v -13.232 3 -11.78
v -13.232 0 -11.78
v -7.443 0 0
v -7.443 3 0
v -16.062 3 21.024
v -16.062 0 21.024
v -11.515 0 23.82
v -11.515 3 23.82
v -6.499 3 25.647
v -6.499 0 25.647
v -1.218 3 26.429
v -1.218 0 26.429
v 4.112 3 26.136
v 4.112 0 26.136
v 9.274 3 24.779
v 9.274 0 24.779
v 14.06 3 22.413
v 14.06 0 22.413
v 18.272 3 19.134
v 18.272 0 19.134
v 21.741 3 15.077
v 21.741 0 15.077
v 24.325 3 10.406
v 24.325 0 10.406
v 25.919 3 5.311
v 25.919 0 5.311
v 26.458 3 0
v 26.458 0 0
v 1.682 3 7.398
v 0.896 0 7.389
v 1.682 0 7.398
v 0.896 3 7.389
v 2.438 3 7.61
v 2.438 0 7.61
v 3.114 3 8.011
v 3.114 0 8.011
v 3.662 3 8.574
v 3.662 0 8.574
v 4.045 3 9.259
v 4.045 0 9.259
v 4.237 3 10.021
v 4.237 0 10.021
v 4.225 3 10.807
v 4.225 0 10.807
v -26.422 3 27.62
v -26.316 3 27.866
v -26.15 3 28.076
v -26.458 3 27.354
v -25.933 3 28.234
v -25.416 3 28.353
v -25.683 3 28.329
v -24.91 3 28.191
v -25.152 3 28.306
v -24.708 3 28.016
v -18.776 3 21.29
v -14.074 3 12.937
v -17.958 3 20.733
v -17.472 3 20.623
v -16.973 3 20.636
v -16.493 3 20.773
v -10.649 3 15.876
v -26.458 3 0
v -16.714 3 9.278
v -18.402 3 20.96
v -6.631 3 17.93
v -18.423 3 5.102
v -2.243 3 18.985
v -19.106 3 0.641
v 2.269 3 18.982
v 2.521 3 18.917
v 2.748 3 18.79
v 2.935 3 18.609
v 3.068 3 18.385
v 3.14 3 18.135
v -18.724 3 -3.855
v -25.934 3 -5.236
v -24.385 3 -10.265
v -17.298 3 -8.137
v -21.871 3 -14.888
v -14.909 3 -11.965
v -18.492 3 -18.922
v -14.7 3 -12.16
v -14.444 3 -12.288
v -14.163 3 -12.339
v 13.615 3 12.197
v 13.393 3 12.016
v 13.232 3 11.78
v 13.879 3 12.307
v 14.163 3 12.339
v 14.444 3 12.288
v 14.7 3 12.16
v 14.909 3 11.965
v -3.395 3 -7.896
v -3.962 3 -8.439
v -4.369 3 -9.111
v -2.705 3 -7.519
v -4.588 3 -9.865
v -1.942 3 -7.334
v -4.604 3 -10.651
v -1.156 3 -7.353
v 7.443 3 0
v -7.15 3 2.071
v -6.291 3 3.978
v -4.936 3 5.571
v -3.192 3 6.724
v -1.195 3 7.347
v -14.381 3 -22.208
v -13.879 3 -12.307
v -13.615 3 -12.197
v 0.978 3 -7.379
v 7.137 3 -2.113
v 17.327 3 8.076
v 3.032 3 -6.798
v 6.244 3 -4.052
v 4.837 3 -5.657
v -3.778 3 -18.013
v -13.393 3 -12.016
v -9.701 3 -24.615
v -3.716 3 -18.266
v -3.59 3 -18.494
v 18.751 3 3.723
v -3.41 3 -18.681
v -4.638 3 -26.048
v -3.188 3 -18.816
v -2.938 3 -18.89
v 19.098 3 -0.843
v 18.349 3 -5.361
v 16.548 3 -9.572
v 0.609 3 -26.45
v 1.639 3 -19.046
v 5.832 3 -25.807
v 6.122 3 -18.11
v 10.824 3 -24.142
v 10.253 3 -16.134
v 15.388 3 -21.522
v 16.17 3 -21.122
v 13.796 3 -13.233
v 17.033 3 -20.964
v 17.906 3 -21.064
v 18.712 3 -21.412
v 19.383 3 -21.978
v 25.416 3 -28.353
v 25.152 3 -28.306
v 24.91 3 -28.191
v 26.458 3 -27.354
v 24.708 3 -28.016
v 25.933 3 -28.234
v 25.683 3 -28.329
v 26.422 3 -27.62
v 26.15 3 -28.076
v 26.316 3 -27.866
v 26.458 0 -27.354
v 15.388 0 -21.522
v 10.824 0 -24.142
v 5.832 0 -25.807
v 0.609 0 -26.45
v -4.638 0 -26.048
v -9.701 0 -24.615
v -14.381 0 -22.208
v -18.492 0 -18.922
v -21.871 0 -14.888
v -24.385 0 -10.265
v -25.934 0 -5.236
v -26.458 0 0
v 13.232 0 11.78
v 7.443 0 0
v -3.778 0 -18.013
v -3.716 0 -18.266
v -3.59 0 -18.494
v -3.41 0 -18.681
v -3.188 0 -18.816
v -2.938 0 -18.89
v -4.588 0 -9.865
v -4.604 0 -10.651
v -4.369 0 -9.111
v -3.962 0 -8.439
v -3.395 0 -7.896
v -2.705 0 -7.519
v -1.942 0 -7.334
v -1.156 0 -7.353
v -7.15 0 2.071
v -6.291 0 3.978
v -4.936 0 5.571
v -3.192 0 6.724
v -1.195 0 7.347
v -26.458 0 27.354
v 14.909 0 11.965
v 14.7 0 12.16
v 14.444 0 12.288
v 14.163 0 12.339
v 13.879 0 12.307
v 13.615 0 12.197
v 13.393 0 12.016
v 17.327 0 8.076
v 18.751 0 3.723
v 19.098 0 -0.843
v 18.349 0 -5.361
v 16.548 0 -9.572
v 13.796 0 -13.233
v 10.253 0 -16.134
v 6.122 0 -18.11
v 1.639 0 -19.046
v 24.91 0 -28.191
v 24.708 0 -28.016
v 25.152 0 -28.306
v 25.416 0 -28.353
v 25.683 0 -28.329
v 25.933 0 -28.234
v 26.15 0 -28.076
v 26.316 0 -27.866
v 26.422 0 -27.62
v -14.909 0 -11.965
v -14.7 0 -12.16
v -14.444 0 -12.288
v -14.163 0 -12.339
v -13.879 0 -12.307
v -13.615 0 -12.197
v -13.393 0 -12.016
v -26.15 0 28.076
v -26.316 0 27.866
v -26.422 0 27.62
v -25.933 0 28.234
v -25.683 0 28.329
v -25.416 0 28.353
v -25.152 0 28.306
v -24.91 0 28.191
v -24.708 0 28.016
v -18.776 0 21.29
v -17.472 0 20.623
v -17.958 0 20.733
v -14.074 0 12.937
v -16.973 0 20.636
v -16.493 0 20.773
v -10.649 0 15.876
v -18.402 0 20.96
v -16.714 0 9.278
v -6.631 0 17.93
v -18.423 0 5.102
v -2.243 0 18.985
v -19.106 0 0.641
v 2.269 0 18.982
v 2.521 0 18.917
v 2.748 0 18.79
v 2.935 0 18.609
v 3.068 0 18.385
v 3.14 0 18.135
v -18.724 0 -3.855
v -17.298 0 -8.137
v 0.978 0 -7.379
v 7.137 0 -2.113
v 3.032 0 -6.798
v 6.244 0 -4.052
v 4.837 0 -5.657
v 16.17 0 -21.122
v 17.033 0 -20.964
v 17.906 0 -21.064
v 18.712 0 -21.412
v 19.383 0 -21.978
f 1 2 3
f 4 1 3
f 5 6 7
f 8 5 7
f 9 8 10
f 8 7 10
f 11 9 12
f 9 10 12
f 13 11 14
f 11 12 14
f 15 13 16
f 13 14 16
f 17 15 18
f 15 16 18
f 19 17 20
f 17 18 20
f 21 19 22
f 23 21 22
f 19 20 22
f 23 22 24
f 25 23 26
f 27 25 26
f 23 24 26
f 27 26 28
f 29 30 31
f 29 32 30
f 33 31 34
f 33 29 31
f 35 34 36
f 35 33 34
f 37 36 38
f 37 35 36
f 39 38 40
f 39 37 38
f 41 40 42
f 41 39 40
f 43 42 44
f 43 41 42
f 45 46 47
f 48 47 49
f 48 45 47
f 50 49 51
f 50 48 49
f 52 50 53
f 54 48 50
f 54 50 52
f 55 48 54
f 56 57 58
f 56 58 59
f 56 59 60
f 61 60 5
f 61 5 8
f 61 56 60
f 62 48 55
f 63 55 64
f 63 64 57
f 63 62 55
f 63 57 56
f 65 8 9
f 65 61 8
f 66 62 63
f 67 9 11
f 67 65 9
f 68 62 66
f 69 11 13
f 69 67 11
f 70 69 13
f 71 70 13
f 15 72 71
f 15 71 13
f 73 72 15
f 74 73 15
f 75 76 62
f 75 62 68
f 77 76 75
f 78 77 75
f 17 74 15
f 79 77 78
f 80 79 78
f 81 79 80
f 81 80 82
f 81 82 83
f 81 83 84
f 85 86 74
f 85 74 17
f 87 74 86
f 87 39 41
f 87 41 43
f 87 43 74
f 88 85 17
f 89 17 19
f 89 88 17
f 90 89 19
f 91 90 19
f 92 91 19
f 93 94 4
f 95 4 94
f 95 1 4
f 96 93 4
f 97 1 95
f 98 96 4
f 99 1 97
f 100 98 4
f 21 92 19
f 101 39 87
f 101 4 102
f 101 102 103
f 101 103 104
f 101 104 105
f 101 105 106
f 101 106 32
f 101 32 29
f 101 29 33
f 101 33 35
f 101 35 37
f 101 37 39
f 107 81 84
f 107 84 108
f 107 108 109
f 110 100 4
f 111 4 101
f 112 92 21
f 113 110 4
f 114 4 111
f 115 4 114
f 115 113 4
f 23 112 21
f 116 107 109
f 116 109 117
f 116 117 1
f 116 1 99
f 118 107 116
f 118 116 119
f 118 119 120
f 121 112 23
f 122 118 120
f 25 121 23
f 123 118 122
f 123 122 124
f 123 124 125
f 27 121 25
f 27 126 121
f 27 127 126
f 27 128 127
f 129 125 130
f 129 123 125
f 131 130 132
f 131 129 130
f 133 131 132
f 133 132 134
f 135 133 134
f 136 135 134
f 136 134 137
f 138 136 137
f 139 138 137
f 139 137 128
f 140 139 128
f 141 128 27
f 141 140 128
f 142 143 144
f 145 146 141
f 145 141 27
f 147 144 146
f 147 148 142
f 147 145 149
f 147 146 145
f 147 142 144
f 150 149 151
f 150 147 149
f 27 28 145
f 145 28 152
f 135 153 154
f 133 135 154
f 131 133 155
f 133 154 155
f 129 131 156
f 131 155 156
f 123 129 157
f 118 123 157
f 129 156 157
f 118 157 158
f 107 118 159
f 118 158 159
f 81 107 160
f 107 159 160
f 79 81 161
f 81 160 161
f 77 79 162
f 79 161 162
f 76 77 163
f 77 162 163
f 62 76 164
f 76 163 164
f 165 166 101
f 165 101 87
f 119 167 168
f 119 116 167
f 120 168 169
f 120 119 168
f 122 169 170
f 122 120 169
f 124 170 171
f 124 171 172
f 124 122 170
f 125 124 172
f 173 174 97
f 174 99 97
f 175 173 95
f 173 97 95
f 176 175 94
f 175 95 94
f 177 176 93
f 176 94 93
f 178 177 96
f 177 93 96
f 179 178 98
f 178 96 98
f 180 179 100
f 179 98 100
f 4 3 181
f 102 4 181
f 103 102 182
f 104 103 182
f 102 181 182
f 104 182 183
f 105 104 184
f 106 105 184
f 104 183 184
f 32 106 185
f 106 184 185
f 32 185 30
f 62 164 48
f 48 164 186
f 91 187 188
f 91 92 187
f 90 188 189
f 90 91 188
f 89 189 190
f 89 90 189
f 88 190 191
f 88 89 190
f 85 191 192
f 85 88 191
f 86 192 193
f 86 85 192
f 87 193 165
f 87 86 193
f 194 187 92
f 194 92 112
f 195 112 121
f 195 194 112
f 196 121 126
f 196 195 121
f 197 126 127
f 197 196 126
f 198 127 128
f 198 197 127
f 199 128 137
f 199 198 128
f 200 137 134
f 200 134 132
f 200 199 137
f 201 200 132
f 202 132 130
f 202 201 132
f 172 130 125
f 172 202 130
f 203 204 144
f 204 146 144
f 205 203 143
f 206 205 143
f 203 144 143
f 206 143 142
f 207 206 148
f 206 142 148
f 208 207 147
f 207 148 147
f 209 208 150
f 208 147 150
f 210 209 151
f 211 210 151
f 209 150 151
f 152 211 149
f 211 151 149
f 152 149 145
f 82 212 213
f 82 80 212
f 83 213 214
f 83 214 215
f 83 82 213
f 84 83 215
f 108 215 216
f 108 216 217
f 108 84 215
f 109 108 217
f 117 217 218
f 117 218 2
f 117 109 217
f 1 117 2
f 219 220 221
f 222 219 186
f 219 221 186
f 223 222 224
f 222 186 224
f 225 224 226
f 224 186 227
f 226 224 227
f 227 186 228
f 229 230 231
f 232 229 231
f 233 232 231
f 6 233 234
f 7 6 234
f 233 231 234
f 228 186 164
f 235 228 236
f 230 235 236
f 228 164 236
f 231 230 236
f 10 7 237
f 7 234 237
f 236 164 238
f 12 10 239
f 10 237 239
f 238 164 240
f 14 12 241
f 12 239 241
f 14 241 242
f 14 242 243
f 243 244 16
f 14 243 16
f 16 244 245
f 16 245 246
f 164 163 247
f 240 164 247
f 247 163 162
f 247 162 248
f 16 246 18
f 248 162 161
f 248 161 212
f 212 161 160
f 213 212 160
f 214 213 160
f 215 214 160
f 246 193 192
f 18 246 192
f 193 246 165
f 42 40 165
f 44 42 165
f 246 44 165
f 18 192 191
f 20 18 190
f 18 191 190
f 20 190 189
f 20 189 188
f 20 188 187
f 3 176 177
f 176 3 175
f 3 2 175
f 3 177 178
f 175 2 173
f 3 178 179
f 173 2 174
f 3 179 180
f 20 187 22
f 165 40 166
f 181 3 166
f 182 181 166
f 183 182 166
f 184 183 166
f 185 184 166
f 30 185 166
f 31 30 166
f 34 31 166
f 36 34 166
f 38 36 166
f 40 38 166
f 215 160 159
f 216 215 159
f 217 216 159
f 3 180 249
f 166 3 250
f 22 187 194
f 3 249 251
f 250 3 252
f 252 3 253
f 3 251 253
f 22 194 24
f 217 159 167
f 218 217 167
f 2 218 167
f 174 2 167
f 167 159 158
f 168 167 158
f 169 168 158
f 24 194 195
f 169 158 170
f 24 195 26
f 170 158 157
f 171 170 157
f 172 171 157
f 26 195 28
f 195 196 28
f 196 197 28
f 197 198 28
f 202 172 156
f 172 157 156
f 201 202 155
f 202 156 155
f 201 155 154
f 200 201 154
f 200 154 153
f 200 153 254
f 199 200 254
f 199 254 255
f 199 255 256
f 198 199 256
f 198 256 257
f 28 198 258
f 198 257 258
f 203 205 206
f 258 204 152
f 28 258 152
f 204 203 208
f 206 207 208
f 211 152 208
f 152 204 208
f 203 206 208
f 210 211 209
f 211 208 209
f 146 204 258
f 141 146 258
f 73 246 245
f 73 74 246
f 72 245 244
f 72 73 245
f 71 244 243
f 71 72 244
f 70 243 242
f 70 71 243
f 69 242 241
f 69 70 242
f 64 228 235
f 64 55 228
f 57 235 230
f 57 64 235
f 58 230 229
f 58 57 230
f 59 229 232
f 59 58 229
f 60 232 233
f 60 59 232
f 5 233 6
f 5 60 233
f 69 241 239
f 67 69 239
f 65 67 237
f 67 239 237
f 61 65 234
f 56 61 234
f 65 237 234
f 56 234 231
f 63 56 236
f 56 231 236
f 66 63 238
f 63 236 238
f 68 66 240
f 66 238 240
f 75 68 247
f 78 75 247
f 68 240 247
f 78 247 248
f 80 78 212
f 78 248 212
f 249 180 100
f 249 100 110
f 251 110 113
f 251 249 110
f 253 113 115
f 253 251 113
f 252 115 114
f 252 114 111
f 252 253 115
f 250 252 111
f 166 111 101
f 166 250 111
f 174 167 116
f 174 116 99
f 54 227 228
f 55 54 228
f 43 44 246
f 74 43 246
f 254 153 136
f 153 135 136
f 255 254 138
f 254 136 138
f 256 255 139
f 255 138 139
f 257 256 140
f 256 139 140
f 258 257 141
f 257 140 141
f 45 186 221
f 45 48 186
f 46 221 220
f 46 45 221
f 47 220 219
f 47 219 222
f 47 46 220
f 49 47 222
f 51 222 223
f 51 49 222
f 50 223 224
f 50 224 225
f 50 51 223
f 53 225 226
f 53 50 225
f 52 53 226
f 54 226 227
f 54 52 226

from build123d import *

# Parameters (mm, degrees)
RESSALTO_EXTRUS_O1_DEPTH = 3
FILETE2_R                = 1
FILETE3_R                = 1
FILETE4_R                = 3
FILETE5_R                = 1
FILETE6_R                = 2
FILETE8_R                = 3
FILETE9_R                = 1
FILETE10_R               = 1
FILETE11_R               = 1
FILETE12_R               = 3


with BuildPart() as part:
    # Esboço1 → Ressalto-extrusão1 (new body)
    with BuildSketch(Plane(origin=(0, 0, 0), x_dir=(1, 0, 0), z_dir=(0, 1, 0))):
        with BuildLine():
            Line((-26.457513111, 0), (-26.457513111, -30))
            Line((-26.457513111, -30), (-17.5, -19.843134833))
            ThreePointArc((-17.5, -19.843134833), (10.885621722, -24.114378278), (26.457513111, 0))
            Line((26.457513111, 0), (26.457513111, 30))
            Line((26.457513111, 30), (17.5, 19.843134833))
            ThreePointArc((17.5, 19.843134833), (-10.885621722, 24.114378278), (-26.457513111, 0))
        make_face()
        with BuildLine():
            Line((5.009713089, -5.505167823), (3.030153969, -18.87502089))
            ThreePointArc((3.030153969, -18.87502089), (-16.899174829, -8.936785595), (-13.894779058, 13.129484439))
            Line((-13.894779058, 13.129484439), (-7.443392908, 0))
            ThreePointArc((-7.443392908, 0), (-3.009554378, -6.80783963), (5.009713089, -5.505167823))
        make_face(mode=Mode.SUBTRACT)
        with BuildLine():
            ThreePointArc((13.894779058, -13.129484439), (16.738722413, 9.233819289), (-3.694798692, 18.756244542))
            Line((-3.694798692, 18.756244542), (-5.200992817, 5.324825979))
            ThreePointArc((-5.200992817, 5.324825979), (2.888863526, 6.8599246), (7.443392908, 0))
            Line((7.443392908, 0), (13.894779058, -13.129484439))
        make_face(mode=Mode.SUBTRACT)
    extrude(amount=RESSALTO_EXTRUS_O1_DEPTH)

    # Filete2
    filete2_edges = [part.edges().sort_by_distance(p)[0] for p in [
        (26.457513111, 1.5, -30),
    ]]
    fillet(filete2_edges, radius=FILETE2_R)

    # Filete3
    filete3_edges = [part.edges().sort_by_distance(p)[0] for p in [
        (-26.457513111, 1.5, 30),
    ]]
    fillet(filete3_edges, radius=FILETE3_R)

    # Filete4
    filete4_edges = [part.edges().sort_by_distance(p)[0] for p in [
        (-5.200992817, 1.5, -5.324825979),
    ]]
    fillet(filete4_edges, radius=FILETE4_R)

    # Filete5
    filete5_edges = [part.edges().sort_by_distance(p)[0] for p in [
        (-3.694798692, 1.5, -18.756244542),
    ]]
    fillet(filete5_edges, radius=FILETE5_R)

    # Filete6
    filete6_edges = [part.edges().sort_by_distance(p)[0] for p in [
        (-17.5, 1.5, 19.843134833),
    ]]
    fillet(filete6_edges, radius=FILETE6_R)

    # Filete8
    filete8_edges = [part.edges().sort_by_distance(p)[0] for p in [
        (5.009713089, 1.5, 5.505167823),
    ]]
    fillet(filete8_edges, radius=FILETE8_R)

    # Filete9
    filete9_edges = [part.edges().sort_by_distance(p)[0] for p in [
        (3.030153969, 1.5, 18.87502089),
    ]]
    fillet(filete9_edges, radius=FILETE9_R)

    # Filete10
    filete10_edges = [part.edges().sort_by_distance(p)[0] for p in [
        (13.894779058, 1.5, 13.129484439),
    ]]
    fillet(filete10_edges, radius=FILETE10_R)

    # Filete11
    filete11_edges = [part.edges().sort_by_distance(p)[0] for p in [
        (-13.894779058, 1.5, -13.129484439),
    ]]
    fillet(filete11_edges, radius=FILETE11_R)

    # Filete12
    filete12_edges = [part.edges().sort_by_distance(p)[0] for p in [
        (17.5, 1.5, -19.843134833),
    ]]
    fillet(filete12_edges, radius=FILETE12_R)


solid = part.part
